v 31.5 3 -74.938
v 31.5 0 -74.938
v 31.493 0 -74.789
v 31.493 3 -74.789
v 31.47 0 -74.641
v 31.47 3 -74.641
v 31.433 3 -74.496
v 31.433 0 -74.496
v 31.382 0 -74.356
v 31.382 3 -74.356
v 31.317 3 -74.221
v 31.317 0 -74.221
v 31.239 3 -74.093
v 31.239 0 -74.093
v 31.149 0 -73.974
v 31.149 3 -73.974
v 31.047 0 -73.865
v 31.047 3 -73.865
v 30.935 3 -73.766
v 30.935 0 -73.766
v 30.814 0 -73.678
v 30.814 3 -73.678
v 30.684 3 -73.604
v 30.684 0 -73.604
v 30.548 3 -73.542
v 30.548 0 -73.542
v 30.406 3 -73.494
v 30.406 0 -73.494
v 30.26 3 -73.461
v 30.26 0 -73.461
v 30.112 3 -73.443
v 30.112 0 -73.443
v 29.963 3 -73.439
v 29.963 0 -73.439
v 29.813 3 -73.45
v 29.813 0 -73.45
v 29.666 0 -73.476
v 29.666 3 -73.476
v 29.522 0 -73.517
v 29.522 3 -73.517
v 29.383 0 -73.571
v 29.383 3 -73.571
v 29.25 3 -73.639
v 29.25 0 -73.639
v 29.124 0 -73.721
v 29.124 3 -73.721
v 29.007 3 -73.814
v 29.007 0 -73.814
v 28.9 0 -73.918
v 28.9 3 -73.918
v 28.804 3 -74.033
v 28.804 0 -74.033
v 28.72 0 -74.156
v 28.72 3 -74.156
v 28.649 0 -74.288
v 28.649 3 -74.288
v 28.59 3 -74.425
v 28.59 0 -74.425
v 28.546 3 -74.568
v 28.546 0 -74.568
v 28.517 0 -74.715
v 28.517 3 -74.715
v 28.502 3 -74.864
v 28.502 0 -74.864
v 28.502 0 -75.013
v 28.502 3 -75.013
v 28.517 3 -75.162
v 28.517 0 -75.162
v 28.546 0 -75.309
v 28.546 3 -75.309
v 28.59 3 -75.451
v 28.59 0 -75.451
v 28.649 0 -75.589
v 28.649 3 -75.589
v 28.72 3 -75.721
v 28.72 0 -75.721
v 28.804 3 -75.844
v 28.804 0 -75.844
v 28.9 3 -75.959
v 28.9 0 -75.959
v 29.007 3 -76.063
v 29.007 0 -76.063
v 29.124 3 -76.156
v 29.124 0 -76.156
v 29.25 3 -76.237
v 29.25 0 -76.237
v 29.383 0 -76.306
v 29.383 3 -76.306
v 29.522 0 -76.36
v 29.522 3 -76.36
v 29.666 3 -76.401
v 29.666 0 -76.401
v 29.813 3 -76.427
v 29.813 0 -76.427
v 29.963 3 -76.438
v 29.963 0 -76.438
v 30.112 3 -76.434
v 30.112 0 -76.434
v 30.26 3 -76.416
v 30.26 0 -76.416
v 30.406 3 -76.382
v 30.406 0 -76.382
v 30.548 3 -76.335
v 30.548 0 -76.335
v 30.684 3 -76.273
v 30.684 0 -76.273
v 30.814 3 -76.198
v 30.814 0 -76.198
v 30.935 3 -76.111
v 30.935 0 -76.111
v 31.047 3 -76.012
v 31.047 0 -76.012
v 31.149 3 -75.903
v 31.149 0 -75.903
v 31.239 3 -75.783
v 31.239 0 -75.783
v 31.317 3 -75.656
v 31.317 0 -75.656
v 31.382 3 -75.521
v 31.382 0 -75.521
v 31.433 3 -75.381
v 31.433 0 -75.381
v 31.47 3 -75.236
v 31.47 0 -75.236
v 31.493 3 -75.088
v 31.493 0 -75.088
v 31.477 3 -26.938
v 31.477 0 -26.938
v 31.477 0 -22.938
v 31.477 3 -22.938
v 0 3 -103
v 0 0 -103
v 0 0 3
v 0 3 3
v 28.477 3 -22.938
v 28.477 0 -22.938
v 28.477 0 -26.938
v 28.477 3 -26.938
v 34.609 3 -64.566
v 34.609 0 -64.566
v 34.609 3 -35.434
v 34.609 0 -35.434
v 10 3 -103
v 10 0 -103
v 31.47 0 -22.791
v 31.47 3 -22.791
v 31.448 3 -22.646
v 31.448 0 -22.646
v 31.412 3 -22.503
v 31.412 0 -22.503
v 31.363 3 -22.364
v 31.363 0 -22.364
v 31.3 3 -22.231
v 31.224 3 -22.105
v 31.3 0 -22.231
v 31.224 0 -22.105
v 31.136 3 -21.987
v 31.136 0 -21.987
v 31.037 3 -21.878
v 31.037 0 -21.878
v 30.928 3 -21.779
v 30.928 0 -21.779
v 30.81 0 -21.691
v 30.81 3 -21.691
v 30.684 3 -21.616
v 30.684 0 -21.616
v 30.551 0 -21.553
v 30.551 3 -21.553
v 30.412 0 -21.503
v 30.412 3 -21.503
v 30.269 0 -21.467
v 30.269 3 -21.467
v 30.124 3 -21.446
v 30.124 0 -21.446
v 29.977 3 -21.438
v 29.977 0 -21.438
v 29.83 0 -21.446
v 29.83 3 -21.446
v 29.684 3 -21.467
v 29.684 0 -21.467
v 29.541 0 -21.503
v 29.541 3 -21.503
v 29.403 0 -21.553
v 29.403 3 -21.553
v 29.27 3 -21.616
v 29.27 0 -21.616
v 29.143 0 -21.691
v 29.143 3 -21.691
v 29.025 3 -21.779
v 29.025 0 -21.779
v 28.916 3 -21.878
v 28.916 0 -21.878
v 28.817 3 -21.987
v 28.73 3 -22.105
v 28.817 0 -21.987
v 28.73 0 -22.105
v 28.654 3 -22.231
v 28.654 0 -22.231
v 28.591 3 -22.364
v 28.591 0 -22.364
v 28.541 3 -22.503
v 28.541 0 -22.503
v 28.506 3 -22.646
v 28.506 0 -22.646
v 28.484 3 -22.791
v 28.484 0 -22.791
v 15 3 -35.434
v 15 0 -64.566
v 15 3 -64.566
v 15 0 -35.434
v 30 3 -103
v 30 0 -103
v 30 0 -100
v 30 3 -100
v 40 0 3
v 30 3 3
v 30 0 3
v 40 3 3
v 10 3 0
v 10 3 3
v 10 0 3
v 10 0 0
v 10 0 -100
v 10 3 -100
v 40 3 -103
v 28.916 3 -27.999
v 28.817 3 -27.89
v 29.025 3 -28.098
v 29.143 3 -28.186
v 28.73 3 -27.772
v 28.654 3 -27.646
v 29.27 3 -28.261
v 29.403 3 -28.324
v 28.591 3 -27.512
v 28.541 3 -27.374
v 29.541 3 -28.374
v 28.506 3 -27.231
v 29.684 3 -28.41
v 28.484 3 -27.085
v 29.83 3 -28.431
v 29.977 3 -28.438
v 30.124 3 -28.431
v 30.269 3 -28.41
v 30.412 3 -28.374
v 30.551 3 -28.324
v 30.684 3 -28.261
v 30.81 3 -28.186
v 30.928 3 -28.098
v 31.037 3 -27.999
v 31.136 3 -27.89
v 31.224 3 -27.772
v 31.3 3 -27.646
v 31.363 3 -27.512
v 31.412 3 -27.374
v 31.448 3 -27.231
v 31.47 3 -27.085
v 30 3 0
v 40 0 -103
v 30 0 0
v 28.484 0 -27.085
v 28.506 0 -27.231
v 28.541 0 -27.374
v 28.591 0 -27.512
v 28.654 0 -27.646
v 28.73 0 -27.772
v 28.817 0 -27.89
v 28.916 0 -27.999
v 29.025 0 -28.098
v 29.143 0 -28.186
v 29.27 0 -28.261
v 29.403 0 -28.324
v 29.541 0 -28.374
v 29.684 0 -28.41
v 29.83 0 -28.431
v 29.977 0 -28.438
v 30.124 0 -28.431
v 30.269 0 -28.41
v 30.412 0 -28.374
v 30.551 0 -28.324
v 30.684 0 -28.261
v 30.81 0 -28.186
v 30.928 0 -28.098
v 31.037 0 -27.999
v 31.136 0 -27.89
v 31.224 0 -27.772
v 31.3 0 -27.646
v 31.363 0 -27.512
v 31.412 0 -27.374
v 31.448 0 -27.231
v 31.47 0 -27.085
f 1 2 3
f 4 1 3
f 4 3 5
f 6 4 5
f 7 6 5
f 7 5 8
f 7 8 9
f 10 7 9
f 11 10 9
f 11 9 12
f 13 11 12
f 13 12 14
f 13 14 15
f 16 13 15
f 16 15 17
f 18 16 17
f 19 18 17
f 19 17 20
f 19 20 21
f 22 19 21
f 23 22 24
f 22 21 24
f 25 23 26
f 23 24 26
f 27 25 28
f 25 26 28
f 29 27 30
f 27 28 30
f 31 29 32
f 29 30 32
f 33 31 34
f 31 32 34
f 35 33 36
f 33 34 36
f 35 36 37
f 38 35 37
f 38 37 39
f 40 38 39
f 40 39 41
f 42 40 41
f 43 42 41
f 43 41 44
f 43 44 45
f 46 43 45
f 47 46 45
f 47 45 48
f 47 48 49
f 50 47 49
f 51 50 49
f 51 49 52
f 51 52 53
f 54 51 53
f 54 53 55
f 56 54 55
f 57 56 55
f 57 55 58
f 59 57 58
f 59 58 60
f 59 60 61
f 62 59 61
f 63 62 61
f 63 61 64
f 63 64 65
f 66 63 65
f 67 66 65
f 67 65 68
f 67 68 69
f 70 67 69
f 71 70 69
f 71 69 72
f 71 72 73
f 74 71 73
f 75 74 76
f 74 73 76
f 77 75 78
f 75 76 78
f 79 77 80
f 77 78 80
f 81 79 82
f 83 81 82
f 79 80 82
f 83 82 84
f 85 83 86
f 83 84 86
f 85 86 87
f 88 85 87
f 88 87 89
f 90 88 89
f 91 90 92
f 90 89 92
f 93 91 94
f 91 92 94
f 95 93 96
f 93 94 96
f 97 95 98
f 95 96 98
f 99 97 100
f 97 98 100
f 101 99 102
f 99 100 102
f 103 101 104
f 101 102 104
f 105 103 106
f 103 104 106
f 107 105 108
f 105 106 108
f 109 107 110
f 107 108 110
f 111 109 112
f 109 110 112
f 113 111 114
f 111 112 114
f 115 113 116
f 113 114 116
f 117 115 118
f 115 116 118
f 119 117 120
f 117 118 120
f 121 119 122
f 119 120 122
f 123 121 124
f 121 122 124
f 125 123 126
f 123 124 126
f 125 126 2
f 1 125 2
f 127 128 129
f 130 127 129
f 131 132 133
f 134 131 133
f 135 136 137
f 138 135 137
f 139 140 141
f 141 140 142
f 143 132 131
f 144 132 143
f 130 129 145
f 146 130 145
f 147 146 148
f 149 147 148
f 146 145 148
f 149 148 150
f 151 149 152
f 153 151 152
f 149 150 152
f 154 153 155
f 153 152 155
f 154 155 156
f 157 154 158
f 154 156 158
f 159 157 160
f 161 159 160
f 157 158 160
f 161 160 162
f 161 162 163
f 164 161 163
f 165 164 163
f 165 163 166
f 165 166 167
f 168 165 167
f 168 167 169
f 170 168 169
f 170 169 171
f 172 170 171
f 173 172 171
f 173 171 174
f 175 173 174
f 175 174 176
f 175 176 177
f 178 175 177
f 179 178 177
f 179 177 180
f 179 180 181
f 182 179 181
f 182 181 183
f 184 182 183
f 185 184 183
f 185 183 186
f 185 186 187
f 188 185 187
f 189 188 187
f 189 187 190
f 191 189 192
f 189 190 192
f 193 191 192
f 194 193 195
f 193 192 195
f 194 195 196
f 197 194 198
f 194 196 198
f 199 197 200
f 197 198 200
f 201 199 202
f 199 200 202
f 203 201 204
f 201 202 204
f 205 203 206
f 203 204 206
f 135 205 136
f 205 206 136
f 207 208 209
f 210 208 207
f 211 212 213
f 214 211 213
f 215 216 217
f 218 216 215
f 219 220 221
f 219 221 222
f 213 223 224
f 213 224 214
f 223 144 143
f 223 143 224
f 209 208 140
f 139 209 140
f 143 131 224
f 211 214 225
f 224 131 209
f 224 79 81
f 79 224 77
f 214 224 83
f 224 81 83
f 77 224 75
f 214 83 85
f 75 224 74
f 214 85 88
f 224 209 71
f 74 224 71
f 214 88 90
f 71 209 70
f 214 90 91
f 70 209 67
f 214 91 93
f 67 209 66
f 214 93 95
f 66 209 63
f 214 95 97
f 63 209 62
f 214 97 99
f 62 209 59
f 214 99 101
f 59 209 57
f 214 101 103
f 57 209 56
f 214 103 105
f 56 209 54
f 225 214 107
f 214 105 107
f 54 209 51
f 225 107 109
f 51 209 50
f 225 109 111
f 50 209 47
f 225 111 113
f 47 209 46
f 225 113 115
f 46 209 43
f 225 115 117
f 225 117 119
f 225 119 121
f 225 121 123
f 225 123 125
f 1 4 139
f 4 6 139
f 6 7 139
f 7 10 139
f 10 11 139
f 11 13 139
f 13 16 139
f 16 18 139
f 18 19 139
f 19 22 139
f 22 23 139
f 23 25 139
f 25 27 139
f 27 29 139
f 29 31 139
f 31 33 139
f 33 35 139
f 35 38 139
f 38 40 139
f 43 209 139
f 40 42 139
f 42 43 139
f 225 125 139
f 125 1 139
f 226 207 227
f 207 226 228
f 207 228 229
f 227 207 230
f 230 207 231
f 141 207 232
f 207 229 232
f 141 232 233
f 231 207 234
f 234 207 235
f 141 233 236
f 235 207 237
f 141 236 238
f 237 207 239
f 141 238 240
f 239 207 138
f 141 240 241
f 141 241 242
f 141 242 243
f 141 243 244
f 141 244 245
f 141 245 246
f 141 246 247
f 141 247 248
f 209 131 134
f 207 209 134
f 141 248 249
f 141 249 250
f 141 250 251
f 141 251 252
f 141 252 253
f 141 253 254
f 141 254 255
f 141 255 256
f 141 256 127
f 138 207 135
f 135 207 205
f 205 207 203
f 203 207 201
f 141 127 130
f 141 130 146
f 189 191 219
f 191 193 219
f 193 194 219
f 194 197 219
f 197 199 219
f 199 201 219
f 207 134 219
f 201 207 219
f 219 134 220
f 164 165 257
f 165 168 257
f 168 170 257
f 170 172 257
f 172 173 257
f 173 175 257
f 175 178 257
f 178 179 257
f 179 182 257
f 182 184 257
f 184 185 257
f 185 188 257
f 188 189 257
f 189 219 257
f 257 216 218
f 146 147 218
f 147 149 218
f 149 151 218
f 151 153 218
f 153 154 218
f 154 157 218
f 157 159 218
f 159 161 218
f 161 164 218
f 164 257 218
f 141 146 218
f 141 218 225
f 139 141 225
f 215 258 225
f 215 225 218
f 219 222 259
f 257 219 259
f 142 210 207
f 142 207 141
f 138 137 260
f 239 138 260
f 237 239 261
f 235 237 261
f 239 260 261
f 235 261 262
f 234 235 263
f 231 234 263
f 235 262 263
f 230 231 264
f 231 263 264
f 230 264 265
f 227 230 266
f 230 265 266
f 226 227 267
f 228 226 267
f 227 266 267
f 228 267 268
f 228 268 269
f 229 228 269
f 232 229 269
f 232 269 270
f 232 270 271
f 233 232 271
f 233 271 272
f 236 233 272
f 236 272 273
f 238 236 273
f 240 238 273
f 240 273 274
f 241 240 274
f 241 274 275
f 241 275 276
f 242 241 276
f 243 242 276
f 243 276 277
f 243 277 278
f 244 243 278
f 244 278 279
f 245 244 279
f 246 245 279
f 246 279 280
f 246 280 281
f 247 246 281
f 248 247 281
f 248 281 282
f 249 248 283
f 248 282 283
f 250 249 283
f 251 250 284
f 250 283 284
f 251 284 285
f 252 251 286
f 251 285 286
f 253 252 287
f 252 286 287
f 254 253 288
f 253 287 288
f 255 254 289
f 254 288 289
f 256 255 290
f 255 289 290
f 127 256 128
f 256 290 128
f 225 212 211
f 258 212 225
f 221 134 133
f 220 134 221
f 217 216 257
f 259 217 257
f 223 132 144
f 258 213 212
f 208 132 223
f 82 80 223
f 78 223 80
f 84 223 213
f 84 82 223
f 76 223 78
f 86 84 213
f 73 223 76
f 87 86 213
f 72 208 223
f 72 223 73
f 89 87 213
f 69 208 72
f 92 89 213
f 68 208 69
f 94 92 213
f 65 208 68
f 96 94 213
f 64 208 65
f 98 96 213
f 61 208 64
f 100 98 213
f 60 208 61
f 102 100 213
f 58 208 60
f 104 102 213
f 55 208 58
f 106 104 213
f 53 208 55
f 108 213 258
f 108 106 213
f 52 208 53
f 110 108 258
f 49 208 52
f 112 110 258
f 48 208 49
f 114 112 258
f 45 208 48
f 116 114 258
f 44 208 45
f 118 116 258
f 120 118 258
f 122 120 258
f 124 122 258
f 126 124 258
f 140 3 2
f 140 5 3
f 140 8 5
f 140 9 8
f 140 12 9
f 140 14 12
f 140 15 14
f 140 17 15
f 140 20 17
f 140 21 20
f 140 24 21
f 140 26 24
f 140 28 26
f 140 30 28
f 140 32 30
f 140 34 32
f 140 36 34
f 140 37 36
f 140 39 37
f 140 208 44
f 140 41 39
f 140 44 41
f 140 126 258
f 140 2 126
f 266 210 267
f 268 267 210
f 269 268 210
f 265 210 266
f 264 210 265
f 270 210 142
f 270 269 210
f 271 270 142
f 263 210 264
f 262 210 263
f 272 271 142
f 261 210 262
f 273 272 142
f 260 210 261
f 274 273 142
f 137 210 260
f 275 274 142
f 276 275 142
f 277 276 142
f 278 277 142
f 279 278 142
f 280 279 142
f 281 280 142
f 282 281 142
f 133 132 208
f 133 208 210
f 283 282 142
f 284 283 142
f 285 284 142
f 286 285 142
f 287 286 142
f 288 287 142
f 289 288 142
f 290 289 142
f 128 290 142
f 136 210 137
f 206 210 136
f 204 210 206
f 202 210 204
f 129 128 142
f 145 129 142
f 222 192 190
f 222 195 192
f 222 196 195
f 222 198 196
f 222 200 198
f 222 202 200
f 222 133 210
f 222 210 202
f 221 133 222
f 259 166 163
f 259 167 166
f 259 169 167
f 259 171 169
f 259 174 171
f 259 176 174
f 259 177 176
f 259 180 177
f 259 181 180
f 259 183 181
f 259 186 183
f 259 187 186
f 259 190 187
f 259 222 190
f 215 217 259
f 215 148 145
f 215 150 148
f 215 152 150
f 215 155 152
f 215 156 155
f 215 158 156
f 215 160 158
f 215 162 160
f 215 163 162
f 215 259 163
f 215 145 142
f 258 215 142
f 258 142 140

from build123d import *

# Parameters (mm, degrees)
SKETCH1_W           = 120
SKETCH1_H           = 100
BOSS_EXTRUDE1_DEPTH = 3
SKETCH2_W           = 10
SKETCH2_H           = 3
SKETCH2_W_2         = 20
BOSS_EXTRUDE3_DEPTH = 3
SKETCH3_W           = 10
SKETCH3_H           = 3
SKETCH3_W_2         = 20
BOSS_EXTRUDE4_DEPTH = 3
SKETCH5_W           = 80
SKETCH5_H           = 106
CUT_EXTRUDE1_DEPTH  = 3
SKETCH6_R           = 1.5
CUT_EXTRUDE2_DEPTH  = 10
SKETCH7_W           = 19.608717555
SKETCH7_H           = 29.132951796
CUT_EXTRUDE3_DEPTH  = 10


with BuildPart() as part:
    # Sketch1 → Boss-Extrude1 (new body)
    with BuildSketch(Plane(origin=(0, 0, 0), x_dir=(1, 0, 0), z_dir=(0, 1, 0))):
        with Locations((60, 50)):
            Rectangle(SKETCH1_W, SKETCH1_H)
    extrude(amount=BOSS_EXTRUDE1_DEPTH)

    # Sketch2 → Boss-Extrude3 (add)
    with BuildSketch(Plane(origin=(0, 3, 0), x_dir=(1, 0, 0), z_dir=(0, 1, 0))):
        with Locations((5, -1.5)):
            Rectangle(SKETCH2_W, SKETCH2_H)
        with Locations((40, -1.5)):
            Rectangle(SKETCH2_W_2, SKETCH2_H)
        with Locations((80, -1.5)):
            Rectangle(SKETCH2_W_2, SKETCH2_H)
        with Locations((115, -1.5)):
            Rectangle(SKETCH2_W, SKETCH2_H)
    extrude(amount=-BOSS_EXTRUDE3_DEPTH)

    # Sketch3 → Boss-Extrude4 (add)
    with BuildSketch(Plane.XZ):
        with Locations((5, -101.5)):
            Rectangle(SKETCH3_W, SKETCH3_H)
        with Locations((40, -101.5)):
            Rectangle(SKETCH3_W_2, SKETCH3_H)
        with Locations((80, -101.5)):
            Rectangle(SKETCH3_W_2, SKETCH3_H)
        with Locations((115, -101.5)):
            Rectangle(SKETCH3_W, SKETCH3_H)
    extrude(amount=-BOSS_EXTRUDE4_DEPTH)

    # Sketch5 → Cut-Extrude1 (cut)
    with BuildSketch(Plane.XZ):
        with Locations((80, -50)):
            Rectangle(SKETCH5_W, SKETCH5_H)
    extrude(amount=-CUT_EXTRUDE1_DEPTH, mode=Mode.SUBTRACT)

    # Sketch6 → Cut-Extrude2 (cut)
    with BuildSketch(Plane.XZ):
        with Locations((30, -74.938410105)):
            Circle(SKETCH6_R)
        with BuildLine():
            Line((31.476820396, -26.938410105), (31.476820396, -22.938410105))
            ThreePointArc((31.476820396, -22.938410105), (29.976820396, -21.438410105), (28.476820396, -22.938410105))
            Line((28.476820396, -22.938410105), (28.476820396, -26.938410105))
            ThreePointArc((28.476820396, -26.938410105), (29.976820396, -28.438410105), (31.476820396, -26.938410105))
        make_face()
    extrude(amount=-CUT_EXTRUDE2_DEPTH, mode=Mode.SUBTRACT)

    # Sketch7 → Cut-Extrude3 (cut)
    with BuildSketch(Plane.XZ):
        with Locations((24.804358778, -50)):
            Rectangle(SKETCH7_W, SKETCH7_H)
    extrude(amount=-CUT_EXTRUDE3_DEPTH, mode=Mode.SUBTRACT)


solid = part.part
